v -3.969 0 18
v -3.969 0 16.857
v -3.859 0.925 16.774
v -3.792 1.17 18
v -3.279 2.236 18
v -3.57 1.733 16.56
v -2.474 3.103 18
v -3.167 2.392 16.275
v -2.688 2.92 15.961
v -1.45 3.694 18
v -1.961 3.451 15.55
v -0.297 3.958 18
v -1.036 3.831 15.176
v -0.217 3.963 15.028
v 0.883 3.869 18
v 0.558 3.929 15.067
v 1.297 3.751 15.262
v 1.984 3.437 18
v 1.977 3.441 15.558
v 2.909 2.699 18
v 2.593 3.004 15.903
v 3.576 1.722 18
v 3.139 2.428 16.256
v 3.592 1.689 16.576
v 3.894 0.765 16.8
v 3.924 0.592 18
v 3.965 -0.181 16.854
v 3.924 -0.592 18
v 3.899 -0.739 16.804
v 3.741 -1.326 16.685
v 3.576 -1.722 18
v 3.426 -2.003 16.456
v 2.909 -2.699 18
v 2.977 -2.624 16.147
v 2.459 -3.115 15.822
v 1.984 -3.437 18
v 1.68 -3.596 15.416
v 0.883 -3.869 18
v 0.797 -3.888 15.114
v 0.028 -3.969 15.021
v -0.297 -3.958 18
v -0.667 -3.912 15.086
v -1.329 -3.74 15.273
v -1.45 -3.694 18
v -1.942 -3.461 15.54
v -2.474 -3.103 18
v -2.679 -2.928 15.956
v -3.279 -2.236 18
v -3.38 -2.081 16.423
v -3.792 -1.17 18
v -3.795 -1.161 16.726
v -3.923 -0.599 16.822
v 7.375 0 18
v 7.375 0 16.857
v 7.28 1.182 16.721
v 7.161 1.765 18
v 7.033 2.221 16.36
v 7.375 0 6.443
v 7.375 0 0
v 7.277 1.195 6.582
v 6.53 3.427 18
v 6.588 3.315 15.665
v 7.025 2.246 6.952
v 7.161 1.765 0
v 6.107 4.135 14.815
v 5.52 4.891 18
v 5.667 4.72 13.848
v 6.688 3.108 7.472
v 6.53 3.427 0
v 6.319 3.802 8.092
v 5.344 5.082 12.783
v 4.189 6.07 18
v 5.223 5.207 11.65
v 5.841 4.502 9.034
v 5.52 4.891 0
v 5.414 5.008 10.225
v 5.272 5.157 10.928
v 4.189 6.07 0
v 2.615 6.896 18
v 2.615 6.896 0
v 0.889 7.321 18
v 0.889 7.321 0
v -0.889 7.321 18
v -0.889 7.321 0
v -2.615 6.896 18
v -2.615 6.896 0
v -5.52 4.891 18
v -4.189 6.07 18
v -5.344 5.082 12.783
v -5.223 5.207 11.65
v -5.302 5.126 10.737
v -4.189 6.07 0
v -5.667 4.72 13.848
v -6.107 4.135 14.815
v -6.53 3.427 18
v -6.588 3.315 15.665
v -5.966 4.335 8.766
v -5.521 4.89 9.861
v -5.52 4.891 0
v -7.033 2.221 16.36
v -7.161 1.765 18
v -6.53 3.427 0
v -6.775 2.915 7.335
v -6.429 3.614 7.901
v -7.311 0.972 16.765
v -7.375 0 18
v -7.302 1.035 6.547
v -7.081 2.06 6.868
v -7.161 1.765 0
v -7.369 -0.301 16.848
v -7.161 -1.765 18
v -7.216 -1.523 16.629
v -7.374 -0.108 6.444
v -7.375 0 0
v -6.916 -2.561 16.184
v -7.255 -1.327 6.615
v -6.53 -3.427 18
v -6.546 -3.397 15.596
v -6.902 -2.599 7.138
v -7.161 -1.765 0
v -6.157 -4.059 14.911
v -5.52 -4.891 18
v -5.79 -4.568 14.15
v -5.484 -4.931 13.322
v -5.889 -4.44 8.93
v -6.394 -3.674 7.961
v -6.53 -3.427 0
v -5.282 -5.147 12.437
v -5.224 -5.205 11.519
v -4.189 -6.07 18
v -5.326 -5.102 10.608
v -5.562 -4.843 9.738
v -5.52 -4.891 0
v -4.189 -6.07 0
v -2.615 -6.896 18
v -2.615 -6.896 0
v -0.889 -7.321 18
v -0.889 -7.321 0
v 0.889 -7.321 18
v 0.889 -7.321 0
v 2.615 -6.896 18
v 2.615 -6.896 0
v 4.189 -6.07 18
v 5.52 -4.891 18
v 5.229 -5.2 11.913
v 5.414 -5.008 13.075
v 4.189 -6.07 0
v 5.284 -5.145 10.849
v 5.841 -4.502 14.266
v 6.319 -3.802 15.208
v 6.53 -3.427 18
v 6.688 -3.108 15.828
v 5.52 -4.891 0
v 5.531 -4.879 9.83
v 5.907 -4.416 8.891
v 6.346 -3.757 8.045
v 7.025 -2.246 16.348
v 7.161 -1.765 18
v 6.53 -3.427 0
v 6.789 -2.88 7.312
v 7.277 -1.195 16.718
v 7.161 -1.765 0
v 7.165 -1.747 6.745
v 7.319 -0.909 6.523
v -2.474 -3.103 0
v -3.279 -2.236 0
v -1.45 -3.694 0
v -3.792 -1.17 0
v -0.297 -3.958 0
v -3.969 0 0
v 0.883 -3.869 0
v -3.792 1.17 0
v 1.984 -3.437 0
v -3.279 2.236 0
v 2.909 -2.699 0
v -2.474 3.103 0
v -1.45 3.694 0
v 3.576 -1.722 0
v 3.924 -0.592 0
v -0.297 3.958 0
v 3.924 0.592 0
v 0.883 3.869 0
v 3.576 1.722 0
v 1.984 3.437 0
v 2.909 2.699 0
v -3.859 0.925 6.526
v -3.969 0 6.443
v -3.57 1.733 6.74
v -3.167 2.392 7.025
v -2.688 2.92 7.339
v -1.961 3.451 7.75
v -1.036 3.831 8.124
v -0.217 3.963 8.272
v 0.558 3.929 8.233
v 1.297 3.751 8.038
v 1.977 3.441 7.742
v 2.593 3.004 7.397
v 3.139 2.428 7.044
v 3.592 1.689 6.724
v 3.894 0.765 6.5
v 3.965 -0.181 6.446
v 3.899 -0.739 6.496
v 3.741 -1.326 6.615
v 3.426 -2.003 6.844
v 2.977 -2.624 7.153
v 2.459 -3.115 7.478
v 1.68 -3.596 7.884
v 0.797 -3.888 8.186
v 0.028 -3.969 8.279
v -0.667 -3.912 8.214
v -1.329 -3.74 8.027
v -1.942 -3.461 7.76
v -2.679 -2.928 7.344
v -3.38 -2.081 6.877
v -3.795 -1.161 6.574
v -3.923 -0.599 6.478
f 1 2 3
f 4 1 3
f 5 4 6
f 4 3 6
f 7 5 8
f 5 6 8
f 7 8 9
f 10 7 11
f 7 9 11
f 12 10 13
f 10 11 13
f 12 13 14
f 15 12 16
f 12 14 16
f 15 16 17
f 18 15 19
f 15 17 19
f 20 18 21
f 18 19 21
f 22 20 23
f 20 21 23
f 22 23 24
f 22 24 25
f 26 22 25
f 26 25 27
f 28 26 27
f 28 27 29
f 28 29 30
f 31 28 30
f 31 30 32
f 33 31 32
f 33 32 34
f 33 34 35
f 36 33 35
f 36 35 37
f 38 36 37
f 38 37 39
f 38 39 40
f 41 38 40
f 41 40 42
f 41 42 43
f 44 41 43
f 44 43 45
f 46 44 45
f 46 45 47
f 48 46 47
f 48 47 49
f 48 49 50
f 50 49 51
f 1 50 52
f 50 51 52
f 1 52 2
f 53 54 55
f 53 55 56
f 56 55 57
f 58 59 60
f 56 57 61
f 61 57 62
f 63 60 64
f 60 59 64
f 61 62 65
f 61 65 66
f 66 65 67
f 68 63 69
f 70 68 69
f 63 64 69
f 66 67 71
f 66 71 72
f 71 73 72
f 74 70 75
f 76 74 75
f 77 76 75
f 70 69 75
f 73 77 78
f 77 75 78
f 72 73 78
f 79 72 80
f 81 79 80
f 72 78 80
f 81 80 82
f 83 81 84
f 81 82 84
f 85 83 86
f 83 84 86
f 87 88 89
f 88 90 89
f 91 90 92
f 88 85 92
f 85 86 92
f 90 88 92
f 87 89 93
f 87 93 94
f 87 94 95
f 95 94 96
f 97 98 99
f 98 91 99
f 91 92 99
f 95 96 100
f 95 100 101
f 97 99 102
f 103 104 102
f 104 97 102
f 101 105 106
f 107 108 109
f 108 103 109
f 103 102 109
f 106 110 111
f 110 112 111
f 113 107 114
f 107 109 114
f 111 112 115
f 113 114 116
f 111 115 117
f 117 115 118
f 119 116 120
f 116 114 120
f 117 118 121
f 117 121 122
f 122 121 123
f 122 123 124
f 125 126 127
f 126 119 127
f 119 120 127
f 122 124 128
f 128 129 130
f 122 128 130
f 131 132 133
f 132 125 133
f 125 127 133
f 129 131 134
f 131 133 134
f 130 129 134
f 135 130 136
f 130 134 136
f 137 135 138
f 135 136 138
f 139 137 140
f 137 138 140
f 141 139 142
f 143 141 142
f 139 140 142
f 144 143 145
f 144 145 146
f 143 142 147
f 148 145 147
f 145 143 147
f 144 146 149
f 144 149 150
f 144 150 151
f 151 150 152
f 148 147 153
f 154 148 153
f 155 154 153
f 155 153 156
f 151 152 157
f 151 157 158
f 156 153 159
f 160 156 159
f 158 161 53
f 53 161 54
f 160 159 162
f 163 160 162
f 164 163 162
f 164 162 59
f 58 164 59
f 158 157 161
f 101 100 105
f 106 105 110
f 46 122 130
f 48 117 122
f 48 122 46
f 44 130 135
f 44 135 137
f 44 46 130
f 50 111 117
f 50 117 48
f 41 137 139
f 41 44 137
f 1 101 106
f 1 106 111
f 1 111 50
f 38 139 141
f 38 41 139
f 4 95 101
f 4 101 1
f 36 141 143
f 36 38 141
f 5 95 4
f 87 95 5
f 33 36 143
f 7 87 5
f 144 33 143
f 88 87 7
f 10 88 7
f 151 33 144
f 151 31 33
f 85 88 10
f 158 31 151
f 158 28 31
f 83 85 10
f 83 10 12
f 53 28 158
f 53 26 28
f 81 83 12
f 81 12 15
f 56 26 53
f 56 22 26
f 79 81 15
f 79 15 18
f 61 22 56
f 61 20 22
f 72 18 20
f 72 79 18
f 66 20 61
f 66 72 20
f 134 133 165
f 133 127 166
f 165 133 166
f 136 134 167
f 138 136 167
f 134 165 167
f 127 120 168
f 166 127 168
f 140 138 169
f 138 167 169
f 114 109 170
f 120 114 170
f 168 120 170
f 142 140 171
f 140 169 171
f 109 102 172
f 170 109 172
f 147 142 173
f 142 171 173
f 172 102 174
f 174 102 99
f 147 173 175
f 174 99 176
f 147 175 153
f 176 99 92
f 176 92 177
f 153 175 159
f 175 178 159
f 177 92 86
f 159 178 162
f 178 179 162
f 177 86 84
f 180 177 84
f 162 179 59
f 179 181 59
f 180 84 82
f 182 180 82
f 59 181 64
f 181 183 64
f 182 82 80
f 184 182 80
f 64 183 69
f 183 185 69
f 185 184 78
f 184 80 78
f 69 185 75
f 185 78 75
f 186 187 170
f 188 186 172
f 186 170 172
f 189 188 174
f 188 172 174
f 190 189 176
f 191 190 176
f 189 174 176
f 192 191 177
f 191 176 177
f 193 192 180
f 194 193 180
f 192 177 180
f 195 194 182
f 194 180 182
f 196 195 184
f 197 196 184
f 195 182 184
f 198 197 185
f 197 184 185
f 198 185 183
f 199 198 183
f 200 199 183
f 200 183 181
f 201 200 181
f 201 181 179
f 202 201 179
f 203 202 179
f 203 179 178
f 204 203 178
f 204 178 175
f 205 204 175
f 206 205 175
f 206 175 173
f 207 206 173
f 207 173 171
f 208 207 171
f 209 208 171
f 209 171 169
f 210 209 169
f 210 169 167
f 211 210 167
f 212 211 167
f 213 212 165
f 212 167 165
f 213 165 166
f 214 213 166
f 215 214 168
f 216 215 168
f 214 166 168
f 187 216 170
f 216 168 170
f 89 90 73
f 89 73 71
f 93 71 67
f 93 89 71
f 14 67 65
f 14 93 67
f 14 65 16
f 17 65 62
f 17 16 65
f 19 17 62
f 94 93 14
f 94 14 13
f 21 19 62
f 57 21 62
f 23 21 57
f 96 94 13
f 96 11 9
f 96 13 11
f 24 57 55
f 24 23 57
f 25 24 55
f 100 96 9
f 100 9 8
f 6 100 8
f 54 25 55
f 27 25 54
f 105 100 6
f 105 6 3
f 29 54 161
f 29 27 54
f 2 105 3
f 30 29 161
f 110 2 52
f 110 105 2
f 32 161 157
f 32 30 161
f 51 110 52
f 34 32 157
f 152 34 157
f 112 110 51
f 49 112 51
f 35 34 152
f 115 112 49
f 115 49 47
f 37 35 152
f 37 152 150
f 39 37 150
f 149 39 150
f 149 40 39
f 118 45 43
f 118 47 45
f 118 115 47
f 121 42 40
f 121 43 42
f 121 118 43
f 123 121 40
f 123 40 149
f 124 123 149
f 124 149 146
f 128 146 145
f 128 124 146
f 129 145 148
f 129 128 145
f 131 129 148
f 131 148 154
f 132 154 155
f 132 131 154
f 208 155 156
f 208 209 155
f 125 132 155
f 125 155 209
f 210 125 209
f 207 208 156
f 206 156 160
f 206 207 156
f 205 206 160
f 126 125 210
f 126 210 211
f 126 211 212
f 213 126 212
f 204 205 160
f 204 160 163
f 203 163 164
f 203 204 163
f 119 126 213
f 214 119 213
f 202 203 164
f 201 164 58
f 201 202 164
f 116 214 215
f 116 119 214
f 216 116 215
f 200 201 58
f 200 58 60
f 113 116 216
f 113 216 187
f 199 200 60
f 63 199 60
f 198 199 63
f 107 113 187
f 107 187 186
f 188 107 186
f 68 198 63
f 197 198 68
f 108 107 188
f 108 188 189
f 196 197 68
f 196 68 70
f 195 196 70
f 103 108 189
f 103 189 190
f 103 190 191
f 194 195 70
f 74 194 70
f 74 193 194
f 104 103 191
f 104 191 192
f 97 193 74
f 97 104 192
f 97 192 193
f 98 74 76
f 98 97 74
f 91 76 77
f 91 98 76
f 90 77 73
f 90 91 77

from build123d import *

# Parameters (mm, degrees)
F0_R     = 7.375
F1_DEPTH = 18
F4_R     = 5.207
F5_DEPTH = 14.751
F6_D     = 7.9375


with BuildPart() as f1:
    # F0 (on Top) → F1 (new body)
    with BuildSketch(Plane.XY):
        Circle(F0_R)
    extrude(amount=F1_DEPTH)

    # F4 (on plane+point) → F5 (cut, through all)
    with BuildSketch(Plane.YZ.offset(-7.375)):
        with Locations((0, 11.65)):
            Circle(F4_R)
    extrude(amount=F5_DEPTH, mode=Mode.SUBTRACT)

    # F6 (through all)
    with Locations(Plane.XY.offset(18)):
        with Locations((0, 0)):
            Hole(F6_D / 2)


solid = f1.part
